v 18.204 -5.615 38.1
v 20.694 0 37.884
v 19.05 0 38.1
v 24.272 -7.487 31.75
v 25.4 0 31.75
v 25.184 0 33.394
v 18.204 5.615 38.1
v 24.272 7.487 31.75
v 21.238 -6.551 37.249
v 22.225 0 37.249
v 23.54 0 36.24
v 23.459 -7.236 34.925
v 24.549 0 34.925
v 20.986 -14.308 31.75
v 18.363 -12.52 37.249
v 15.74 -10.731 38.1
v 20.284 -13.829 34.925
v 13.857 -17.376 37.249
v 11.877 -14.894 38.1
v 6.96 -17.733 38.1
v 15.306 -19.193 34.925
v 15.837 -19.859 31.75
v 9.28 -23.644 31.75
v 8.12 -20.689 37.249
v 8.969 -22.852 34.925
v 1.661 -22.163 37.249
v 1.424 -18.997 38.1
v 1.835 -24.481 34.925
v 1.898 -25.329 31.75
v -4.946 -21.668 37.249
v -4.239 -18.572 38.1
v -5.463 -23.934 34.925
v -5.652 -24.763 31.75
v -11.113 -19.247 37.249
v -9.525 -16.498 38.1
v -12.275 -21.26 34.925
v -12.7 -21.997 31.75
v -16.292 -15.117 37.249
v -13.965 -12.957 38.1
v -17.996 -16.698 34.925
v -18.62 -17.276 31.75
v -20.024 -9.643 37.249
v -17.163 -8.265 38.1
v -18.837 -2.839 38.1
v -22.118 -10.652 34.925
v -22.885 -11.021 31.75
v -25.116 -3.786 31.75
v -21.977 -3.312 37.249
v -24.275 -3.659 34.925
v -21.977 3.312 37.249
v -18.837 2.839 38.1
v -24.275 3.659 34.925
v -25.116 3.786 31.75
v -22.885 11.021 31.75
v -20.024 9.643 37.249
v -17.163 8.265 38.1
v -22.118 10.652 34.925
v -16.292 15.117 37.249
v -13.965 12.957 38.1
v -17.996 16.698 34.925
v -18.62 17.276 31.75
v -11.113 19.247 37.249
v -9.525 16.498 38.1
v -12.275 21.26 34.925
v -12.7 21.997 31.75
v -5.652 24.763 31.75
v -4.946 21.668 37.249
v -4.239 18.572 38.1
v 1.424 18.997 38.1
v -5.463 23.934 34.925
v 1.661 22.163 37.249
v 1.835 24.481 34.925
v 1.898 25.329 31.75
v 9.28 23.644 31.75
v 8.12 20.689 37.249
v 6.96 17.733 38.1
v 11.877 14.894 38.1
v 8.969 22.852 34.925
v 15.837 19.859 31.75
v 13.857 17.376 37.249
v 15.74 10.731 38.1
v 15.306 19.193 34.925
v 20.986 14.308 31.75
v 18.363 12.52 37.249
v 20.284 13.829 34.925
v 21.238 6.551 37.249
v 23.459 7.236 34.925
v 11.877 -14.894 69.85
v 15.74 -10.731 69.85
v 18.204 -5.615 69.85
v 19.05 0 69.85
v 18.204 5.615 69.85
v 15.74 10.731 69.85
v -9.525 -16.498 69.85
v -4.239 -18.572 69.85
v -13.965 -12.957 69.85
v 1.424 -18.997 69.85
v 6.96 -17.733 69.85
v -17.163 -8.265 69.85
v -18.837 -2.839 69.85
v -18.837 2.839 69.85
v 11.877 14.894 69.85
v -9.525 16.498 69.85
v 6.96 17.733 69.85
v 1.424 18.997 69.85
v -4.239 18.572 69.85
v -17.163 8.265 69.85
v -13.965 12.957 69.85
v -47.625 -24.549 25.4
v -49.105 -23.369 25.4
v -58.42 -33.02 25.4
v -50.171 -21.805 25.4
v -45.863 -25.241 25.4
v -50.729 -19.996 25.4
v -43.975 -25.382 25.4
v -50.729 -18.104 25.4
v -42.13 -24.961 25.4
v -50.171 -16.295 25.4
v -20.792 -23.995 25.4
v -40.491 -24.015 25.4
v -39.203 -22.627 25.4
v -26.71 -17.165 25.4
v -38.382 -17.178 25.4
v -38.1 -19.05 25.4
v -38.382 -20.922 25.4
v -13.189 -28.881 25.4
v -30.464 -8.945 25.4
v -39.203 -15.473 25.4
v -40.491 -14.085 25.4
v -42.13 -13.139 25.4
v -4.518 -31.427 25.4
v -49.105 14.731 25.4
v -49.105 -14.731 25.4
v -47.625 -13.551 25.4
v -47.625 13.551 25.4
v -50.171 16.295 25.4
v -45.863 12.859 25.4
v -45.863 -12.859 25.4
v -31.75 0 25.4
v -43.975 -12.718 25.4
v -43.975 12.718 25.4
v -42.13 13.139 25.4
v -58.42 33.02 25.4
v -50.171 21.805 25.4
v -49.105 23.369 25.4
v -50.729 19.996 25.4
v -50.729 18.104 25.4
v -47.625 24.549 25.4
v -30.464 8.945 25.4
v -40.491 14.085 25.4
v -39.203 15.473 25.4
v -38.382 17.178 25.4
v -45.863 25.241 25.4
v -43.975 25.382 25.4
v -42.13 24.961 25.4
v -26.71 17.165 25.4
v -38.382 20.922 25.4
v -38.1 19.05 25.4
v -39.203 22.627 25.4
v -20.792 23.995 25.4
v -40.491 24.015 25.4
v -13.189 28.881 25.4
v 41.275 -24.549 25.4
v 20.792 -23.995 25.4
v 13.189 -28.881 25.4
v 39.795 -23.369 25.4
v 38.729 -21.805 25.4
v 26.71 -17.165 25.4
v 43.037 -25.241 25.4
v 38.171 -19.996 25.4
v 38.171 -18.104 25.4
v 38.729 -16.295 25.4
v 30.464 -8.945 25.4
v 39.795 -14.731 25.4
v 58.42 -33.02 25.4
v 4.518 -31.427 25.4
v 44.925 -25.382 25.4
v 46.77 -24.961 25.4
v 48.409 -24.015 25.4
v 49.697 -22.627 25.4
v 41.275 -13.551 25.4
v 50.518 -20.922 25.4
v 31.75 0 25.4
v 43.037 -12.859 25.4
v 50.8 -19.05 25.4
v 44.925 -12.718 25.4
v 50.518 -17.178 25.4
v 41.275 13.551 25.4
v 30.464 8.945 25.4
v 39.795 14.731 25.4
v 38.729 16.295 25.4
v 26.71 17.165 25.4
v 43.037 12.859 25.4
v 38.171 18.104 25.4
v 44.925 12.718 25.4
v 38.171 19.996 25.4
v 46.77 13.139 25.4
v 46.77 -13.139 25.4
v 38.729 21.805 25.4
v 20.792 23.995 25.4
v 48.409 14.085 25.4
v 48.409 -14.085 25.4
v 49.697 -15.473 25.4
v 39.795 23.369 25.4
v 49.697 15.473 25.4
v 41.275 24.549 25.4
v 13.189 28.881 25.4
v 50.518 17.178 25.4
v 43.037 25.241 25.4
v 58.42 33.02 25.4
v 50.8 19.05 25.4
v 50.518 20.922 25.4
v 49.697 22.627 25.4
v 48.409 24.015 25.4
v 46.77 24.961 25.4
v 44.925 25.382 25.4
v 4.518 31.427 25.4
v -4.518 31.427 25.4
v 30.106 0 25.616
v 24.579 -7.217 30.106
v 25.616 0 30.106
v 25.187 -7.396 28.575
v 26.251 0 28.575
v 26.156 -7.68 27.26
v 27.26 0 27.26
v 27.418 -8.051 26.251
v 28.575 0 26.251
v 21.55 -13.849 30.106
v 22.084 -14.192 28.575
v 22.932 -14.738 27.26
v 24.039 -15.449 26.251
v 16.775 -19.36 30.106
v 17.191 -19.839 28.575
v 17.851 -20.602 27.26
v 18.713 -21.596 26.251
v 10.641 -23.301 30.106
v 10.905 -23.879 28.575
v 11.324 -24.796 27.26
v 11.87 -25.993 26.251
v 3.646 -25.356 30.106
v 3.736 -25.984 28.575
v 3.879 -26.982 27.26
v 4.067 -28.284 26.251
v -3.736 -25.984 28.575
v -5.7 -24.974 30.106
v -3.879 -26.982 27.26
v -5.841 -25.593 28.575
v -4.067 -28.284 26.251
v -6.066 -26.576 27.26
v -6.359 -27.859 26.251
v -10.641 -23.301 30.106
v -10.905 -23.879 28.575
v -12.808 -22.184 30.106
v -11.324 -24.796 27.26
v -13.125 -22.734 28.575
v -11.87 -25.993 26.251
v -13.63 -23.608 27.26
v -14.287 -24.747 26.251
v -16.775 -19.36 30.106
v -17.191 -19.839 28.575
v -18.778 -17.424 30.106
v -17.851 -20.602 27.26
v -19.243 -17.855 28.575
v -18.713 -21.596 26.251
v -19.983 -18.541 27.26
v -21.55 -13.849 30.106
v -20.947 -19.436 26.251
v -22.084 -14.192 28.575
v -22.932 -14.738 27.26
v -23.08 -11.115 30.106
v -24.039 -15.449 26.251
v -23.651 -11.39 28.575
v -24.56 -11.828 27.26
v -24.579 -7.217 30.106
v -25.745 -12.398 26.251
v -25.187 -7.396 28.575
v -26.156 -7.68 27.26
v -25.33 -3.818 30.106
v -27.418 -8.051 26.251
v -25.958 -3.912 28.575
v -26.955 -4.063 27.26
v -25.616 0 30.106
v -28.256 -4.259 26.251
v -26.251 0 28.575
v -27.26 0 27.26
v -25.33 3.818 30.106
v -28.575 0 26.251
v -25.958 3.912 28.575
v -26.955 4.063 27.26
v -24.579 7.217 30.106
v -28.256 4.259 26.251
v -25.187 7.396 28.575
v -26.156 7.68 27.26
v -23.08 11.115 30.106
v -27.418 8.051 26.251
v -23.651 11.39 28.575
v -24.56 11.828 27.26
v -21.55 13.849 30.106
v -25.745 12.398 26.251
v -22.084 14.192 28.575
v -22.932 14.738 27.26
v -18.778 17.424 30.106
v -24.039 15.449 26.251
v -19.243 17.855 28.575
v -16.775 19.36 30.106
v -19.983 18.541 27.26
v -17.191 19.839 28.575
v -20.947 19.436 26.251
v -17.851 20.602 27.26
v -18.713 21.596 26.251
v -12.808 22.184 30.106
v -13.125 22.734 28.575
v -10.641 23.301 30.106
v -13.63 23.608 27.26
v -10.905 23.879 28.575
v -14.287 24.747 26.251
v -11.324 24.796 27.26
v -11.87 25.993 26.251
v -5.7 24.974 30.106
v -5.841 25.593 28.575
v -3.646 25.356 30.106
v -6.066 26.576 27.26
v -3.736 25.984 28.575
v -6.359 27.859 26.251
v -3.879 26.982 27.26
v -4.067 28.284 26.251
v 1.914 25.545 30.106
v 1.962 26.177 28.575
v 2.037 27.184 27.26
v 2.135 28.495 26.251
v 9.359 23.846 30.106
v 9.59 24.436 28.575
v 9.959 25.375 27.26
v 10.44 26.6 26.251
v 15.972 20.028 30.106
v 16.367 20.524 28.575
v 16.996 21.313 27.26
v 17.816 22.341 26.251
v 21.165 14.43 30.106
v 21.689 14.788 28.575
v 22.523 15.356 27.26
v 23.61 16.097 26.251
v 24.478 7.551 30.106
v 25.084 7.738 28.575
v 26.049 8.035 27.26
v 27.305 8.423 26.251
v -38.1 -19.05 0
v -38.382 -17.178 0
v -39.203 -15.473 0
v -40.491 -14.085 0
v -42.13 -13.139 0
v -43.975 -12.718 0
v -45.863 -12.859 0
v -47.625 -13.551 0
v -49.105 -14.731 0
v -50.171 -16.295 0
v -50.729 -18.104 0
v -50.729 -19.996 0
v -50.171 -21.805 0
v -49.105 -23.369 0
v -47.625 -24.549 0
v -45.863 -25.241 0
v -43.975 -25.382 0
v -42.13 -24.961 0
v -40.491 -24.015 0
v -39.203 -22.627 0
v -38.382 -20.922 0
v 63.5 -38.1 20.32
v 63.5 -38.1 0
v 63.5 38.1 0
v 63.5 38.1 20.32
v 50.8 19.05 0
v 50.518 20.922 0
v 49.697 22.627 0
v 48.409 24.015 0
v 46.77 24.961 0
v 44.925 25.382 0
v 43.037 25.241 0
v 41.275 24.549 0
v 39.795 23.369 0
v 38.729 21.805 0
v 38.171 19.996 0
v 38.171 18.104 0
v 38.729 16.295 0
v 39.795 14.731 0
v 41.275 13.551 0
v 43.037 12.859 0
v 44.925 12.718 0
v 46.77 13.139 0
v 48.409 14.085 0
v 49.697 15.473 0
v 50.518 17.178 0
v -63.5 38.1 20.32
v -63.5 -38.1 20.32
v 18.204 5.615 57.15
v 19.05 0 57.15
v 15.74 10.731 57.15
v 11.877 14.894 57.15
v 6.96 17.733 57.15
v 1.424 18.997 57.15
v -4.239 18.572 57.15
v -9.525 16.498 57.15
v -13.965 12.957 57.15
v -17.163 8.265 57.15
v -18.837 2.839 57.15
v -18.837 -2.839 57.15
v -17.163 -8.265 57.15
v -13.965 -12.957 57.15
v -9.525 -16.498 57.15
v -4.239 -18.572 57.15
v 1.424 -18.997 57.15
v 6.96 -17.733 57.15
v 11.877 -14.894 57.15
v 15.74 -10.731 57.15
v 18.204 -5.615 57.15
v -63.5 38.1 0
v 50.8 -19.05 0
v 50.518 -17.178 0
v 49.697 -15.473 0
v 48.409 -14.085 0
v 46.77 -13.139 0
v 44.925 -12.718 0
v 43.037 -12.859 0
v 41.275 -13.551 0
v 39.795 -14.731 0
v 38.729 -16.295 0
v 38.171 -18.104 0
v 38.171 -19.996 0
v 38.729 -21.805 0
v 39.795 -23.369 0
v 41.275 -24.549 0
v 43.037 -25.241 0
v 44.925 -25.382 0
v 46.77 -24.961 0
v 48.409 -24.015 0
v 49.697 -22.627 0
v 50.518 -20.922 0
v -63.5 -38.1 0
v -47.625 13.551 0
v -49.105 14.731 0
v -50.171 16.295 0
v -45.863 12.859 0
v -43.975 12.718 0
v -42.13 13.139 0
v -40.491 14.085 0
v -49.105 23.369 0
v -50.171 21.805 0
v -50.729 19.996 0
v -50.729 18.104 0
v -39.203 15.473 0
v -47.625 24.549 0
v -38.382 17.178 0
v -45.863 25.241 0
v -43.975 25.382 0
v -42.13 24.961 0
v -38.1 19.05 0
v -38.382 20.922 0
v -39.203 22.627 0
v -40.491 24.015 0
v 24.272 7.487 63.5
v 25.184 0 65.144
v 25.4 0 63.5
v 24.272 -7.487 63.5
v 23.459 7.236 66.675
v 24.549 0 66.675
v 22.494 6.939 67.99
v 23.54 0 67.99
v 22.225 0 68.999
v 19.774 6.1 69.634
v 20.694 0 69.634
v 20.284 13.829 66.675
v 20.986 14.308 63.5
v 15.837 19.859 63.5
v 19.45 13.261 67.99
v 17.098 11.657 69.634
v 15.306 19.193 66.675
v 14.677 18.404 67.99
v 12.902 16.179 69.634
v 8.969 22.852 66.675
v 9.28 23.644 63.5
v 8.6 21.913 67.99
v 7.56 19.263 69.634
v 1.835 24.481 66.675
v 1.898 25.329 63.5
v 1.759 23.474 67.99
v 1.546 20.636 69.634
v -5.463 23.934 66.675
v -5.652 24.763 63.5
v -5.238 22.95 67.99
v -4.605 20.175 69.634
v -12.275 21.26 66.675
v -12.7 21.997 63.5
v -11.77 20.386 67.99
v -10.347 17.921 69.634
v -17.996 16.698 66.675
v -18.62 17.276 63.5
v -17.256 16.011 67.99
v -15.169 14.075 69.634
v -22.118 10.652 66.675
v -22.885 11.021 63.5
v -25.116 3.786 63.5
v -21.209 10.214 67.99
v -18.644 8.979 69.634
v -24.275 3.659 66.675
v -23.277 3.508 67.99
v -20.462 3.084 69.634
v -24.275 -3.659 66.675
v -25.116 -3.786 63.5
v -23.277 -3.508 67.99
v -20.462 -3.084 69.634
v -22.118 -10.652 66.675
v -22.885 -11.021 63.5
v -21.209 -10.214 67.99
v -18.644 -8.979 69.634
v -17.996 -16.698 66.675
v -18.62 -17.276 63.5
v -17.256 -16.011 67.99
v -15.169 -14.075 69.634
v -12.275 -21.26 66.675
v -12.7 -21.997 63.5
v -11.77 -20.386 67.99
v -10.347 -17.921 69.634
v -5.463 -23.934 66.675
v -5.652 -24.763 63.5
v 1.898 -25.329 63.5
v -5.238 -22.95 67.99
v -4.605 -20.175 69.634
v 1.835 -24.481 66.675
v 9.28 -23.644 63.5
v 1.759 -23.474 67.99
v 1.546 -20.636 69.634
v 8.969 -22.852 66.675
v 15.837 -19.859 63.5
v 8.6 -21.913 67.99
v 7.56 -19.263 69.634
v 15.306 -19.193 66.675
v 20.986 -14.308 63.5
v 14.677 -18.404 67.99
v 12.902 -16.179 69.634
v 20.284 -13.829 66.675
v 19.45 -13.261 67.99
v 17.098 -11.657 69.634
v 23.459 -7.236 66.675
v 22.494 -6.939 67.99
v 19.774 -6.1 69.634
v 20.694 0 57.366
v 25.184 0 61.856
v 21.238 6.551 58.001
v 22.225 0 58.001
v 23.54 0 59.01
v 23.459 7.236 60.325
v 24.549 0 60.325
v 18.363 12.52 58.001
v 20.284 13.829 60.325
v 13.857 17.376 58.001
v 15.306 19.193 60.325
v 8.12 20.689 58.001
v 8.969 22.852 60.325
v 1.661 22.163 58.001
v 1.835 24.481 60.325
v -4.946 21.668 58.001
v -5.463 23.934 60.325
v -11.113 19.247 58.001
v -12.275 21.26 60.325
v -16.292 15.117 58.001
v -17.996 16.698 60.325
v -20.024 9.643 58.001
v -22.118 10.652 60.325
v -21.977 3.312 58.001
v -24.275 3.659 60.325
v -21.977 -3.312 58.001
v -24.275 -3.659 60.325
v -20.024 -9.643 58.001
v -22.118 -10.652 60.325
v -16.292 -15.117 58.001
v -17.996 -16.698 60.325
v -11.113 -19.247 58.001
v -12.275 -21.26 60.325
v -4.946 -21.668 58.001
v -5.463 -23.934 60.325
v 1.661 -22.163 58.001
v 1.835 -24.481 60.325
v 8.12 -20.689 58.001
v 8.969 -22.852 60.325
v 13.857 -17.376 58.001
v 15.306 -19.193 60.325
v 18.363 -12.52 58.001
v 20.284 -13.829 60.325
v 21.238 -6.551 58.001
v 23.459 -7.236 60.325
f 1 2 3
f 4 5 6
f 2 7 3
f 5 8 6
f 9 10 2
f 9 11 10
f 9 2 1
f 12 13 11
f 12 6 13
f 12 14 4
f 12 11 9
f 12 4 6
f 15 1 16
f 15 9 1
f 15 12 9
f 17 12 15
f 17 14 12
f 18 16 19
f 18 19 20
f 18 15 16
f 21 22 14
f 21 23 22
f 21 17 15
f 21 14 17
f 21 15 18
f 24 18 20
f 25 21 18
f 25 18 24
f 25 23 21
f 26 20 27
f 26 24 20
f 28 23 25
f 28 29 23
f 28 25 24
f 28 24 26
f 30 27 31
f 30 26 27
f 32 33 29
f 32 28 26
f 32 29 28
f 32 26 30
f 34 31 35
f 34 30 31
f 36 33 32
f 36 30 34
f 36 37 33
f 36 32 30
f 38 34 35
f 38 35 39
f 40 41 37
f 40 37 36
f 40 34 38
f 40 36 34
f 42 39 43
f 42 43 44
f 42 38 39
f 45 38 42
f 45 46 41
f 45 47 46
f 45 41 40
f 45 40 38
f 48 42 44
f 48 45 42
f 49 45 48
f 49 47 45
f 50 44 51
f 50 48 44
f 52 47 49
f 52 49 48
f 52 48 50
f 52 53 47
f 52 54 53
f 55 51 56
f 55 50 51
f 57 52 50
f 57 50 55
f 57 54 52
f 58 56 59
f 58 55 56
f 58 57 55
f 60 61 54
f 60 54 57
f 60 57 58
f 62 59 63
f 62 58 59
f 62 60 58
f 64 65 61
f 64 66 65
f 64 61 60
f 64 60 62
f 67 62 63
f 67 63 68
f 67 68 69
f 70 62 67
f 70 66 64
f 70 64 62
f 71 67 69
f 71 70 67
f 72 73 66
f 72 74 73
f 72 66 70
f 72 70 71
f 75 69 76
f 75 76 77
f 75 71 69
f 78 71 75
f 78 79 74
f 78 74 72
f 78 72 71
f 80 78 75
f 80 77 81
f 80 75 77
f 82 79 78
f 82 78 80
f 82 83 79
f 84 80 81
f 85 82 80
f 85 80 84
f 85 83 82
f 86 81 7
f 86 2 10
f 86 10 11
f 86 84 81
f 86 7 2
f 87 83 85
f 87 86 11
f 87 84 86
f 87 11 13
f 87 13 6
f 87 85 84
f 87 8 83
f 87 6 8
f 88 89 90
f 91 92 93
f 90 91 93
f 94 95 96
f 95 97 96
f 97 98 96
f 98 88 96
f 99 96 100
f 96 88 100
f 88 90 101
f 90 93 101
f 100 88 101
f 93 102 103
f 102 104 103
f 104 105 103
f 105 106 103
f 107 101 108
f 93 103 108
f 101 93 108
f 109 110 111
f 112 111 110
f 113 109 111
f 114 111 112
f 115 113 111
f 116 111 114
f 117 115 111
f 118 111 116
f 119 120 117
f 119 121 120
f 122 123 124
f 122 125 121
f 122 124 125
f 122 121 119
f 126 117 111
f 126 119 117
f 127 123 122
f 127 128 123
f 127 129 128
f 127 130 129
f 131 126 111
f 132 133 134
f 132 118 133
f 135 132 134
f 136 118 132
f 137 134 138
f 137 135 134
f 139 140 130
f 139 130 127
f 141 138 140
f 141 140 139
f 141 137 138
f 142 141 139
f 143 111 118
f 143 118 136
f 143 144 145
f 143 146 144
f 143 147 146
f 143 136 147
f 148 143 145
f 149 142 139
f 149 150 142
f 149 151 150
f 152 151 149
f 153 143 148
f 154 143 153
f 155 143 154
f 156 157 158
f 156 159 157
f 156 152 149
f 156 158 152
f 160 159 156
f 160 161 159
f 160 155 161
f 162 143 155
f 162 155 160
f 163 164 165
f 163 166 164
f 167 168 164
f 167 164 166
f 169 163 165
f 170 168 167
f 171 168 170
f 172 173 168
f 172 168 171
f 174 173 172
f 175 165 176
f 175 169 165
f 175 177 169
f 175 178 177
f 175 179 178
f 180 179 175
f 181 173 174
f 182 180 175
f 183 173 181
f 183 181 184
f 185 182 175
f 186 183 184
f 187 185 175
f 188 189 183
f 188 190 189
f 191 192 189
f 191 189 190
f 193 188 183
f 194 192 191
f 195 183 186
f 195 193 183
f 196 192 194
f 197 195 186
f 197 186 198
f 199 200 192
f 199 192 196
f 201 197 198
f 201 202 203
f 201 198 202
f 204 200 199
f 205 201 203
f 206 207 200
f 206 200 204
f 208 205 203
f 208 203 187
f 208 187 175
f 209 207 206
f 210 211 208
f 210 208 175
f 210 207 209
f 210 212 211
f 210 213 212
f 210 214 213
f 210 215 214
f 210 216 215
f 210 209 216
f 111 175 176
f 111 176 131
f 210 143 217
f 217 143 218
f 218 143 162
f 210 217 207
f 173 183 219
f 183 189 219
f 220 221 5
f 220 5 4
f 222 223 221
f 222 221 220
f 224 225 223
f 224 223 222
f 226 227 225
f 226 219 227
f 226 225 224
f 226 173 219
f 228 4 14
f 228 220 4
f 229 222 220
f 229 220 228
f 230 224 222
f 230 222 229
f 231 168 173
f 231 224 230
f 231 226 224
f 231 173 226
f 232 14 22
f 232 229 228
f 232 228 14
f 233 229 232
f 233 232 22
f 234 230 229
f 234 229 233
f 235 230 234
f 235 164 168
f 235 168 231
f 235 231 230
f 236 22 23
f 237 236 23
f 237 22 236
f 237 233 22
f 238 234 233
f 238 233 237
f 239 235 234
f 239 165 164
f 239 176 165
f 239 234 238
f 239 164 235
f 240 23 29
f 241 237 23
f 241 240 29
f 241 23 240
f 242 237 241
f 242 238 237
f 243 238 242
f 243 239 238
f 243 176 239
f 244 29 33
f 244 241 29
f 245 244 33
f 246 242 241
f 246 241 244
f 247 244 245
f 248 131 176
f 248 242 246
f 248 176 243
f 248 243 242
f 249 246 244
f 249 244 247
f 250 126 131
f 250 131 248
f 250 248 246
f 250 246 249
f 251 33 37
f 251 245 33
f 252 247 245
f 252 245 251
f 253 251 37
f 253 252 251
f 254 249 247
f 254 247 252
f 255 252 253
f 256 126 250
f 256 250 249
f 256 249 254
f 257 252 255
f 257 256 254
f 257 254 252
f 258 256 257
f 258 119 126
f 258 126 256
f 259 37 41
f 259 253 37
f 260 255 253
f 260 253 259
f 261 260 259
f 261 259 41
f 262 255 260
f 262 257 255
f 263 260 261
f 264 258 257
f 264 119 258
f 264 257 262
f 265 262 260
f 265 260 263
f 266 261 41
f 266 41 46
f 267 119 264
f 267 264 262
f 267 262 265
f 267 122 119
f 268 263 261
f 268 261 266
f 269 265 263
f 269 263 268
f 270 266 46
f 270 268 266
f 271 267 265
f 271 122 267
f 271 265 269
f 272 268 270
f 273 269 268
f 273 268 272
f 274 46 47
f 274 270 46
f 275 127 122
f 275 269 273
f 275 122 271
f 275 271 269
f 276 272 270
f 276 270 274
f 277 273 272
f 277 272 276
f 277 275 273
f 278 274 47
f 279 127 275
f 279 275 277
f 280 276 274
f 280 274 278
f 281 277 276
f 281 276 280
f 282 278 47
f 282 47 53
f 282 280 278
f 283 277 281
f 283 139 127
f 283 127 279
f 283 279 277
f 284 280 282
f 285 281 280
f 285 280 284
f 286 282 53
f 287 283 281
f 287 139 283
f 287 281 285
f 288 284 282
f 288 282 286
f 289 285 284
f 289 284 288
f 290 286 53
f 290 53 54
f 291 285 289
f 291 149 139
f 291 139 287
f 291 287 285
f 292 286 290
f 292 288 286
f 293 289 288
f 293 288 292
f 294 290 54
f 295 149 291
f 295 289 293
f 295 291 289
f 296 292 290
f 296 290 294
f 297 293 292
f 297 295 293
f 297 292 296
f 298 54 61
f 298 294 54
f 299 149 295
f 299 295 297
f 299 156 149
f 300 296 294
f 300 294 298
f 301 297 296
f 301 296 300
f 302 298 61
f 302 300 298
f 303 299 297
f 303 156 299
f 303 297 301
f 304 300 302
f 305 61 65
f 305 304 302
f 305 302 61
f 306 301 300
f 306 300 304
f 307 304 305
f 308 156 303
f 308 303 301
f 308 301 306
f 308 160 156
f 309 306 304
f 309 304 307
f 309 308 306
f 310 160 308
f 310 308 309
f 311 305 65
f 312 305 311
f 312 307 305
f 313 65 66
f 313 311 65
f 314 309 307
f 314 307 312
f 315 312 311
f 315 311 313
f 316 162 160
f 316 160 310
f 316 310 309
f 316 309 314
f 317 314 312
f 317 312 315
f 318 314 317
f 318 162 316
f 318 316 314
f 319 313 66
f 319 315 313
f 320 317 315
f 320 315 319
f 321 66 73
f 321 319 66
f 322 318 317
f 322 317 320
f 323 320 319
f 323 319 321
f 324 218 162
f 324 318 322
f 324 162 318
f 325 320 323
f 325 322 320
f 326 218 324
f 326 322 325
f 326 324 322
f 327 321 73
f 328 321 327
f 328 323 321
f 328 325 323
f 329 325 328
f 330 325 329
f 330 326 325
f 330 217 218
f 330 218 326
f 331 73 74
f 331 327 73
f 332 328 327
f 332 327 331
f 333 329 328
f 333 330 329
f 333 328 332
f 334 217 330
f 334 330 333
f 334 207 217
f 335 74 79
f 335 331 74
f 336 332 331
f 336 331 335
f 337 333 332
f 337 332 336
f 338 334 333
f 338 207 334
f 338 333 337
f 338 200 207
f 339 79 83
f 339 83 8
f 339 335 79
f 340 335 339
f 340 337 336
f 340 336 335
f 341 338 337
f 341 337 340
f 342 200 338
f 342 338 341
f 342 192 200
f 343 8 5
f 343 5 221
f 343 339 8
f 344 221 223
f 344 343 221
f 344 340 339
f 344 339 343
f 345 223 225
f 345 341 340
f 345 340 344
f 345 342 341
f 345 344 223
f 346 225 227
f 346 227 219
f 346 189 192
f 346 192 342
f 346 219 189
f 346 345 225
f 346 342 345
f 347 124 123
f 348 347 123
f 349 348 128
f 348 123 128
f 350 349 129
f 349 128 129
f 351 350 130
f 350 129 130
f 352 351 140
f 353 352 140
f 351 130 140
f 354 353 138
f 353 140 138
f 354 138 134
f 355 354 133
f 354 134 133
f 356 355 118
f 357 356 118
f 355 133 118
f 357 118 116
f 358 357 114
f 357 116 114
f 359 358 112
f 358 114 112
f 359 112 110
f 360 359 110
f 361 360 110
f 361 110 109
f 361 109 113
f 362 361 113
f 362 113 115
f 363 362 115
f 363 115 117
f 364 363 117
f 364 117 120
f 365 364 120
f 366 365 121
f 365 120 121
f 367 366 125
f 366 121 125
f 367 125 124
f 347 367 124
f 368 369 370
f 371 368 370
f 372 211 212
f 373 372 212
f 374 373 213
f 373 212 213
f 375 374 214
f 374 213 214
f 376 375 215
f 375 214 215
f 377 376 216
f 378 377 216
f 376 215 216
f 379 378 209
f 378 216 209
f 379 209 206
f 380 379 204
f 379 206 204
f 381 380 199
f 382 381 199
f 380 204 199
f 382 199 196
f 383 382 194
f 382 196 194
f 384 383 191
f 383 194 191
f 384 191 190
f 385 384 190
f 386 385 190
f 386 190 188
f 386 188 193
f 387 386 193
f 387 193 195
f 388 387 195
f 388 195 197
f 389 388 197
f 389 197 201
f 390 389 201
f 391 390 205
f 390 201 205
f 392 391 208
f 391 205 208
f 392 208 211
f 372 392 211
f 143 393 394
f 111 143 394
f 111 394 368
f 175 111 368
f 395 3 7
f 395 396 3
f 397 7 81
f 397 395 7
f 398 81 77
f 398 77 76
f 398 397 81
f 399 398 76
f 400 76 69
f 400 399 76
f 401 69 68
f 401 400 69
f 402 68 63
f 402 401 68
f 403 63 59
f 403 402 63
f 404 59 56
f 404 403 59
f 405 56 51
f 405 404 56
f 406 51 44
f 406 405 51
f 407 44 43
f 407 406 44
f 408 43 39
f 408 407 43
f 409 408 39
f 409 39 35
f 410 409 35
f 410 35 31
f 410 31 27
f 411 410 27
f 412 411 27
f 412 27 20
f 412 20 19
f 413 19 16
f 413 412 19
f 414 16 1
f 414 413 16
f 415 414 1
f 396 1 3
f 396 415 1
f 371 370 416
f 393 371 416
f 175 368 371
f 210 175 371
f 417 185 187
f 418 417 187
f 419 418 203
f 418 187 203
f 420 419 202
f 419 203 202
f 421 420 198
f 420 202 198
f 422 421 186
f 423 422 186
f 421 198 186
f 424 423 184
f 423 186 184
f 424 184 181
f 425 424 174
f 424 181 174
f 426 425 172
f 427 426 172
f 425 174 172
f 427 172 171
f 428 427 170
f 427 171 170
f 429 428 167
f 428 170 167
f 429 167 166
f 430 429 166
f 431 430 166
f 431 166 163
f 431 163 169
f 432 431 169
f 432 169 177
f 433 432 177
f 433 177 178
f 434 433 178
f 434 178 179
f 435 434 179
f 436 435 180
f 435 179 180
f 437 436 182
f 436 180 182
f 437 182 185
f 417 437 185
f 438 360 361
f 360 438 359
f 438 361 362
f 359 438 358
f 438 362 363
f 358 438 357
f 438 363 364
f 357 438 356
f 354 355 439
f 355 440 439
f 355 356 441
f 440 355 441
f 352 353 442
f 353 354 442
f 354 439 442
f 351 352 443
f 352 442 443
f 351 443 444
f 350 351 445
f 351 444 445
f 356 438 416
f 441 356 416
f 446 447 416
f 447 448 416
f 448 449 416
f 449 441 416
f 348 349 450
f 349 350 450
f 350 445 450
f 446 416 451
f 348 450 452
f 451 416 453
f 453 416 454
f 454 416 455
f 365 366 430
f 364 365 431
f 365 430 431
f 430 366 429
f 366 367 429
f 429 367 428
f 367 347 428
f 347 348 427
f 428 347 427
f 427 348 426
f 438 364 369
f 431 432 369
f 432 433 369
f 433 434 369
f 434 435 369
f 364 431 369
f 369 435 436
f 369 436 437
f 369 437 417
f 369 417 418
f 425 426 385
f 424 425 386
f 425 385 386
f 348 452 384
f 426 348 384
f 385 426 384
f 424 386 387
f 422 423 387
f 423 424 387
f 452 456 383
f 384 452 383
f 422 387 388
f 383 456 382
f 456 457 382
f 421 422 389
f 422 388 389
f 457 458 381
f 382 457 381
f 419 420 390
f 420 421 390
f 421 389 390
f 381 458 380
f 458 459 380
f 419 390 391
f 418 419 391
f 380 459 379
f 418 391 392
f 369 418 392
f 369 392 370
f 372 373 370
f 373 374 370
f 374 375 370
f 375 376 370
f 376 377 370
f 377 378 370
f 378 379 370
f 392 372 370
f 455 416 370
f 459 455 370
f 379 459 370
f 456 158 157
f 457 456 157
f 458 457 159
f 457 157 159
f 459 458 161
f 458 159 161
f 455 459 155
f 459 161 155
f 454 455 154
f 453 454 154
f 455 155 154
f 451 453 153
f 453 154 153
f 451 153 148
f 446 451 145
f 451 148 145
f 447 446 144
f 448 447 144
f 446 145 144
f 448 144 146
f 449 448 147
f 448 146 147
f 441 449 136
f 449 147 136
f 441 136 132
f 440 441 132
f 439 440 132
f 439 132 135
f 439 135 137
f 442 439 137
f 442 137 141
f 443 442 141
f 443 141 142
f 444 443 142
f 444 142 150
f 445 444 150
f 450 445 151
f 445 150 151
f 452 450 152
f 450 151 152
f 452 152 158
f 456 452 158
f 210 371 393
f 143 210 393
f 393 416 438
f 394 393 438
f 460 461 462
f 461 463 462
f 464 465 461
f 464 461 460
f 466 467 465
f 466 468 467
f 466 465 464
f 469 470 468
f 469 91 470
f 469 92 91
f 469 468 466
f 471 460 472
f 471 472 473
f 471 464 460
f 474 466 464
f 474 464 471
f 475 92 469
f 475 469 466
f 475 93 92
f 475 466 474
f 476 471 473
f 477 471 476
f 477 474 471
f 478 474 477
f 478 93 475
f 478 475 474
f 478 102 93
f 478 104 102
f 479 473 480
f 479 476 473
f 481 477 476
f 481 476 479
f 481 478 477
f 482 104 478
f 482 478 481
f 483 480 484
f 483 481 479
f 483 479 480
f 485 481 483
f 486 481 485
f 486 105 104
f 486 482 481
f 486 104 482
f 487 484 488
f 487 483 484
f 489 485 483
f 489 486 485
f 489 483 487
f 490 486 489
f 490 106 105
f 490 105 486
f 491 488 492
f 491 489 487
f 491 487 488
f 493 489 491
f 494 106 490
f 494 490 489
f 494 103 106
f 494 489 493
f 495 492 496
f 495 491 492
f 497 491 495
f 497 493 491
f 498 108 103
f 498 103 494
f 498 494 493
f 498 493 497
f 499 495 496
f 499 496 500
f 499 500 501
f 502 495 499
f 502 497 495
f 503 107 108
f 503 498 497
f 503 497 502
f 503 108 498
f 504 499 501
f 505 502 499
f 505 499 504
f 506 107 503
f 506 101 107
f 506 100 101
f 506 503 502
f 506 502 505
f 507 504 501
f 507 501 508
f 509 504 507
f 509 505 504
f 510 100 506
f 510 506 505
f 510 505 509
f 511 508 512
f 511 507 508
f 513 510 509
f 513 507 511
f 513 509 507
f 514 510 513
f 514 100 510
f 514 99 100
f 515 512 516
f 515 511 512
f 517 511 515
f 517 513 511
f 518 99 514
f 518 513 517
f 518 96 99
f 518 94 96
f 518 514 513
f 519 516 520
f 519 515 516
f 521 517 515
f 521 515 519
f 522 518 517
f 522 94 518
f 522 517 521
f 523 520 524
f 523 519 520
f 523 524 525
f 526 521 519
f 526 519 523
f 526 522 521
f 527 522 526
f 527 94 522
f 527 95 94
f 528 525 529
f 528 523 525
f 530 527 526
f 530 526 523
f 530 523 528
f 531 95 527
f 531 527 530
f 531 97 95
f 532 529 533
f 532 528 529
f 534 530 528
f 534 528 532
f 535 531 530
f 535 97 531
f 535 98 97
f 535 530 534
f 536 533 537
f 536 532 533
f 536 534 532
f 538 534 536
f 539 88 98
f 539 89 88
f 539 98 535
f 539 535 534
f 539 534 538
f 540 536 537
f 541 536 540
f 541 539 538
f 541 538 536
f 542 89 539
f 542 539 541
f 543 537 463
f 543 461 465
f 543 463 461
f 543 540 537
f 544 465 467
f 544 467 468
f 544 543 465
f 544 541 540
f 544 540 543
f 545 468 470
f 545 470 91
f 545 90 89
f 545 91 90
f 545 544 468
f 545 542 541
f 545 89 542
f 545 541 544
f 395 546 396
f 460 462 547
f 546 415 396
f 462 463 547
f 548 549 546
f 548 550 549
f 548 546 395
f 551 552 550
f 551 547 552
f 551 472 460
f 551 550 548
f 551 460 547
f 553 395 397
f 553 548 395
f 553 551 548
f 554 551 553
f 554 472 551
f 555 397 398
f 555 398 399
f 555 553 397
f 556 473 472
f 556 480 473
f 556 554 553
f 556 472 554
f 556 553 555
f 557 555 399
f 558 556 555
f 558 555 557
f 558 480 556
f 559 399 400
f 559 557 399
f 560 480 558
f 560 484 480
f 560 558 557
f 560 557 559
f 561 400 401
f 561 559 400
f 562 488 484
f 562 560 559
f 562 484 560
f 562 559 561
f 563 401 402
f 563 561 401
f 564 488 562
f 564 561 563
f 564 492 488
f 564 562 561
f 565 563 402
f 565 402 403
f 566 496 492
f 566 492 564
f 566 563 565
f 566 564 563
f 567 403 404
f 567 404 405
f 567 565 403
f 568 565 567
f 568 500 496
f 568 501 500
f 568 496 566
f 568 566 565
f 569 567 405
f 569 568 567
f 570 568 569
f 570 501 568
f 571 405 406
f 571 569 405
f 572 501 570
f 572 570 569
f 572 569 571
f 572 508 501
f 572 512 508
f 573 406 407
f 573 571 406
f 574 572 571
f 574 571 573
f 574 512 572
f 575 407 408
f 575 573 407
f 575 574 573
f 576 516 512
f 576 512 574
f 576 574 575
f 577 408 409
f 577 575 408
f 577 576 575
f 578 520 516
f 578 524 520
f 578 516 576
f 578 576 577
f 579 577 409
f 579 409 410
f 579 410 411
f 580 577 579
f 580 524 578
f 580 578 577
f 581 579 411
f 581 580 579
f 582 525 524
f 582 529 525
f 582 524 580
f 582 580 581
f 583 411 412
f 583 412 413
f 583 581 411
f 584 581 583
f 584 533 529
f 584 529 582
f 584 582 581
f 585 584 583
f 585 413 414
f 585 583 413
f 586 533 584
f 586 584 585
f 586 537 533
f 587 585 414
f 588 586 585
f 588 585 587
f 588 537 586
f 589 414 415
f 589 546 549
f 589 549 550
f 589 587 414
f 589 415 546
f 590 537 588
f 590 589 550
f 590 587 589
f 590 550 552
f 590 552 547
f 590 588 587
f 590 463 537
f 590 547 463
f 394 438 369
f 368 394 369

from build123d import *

# Parameters (mm, degrees)
F1_DEPTH = 25.4
F2_R     = 6.35
F3_DEPTH = 25.4
F4_W     = 25.4
F4_H     = 12.7
F6_W     = 19.05
F6_H     = 19.05
F8_W     = 25.4
F8_H     = 12.7
F11_R    = 6.34999
F12_SIZE = 5.08


# Not quite as in the source:
# - a fillet or chamfer is up to 0.001 mm smaller than in the source, because OpenCascade refuses the exact size
# - a feature of the source that left no trace in its solid (it failed there, or was rolled back) is left out


with BuildPart() as f1:
    # F0 (on Top) → F1 (new body)
    with BuildSketch(Plane.XY):
        Polygon((-63.0538856602, 38.1), (-63.5, 38.1), (-63.5, -38.1), (63.5, -38.1), (63.5, 38.1), align=None)
    extrude(amount=F1_DEPTH)

    # F2 (on face) → F3 (cut)
    with BuildSketch(Plane.XY.offset(25.4)):
        with Locations((-44.45, 19.05)):
            Circle(F2_R)
        with Locations((-44.45, -19.05)):
            Circle(F2_R)
        with Locations((44.45, 19.05)):
            Circle(F2_R)
        with Locations((44.45, -19.05)):
            Circle(F2_R)
    extrude(amount=-F3_DEPTH, mode=Mode.SUBTRACT)

    # F4 (on Front) → F5 (revolve)
    with BuildSketch(Plane.XZ):
        with Locations((12.7, 31.75)):
            Rectangle(F4_W, F4_H)
    revolve(axis=Axis((0, 0, 31.75), (0, 0, -1)))

    # F6 (on Front) → F7 (revolve)
    with BuildSketch(Plane.XZ):
        with Locations((9.525, 47.625)):
            Rectangle(F6_W, F6_H)
    revolve(axis=Axis((0, 0, 47.625), (0, 0, 1)))

    # F8 (on Front) → F9 (revolve)
    with BuildSketch(Plane.XZ):
        with Locations((12.7, 63.5)):
            Rectangle(F8_W, F8_H)
    revolve(axis=Axis((0, 0, 63.5), (0, 0, 1)))

    # F11 (radius 6.35 in the source; OpenCascade refuses exactly that, so slightly less here)
    f11_edges = [f1.edges().sort_by_distance(p)[0] for p in [
        (-25.4, 0, 69.85),
        (-25.4, 0, 38.1),
        (-25.4, 0, 57.15),
        (-25.4, 0, 25.4),
        (25.4, 0, 31.75),
    ]]
    fillet(f11_edges, radius=F11_R)

    # F12
    f12_edges = [f1.edges().sort_by_distance(p)[0] for p in [
        (-63.5, 0, 25.4),
        (0, 38.1, 25.4),
        (0, -38.1, 25.4),
        (63.5, 0, 25.4),
    ]]
    chamfer(f12_edges, length=F12_SIZE)


solid = f1.part
